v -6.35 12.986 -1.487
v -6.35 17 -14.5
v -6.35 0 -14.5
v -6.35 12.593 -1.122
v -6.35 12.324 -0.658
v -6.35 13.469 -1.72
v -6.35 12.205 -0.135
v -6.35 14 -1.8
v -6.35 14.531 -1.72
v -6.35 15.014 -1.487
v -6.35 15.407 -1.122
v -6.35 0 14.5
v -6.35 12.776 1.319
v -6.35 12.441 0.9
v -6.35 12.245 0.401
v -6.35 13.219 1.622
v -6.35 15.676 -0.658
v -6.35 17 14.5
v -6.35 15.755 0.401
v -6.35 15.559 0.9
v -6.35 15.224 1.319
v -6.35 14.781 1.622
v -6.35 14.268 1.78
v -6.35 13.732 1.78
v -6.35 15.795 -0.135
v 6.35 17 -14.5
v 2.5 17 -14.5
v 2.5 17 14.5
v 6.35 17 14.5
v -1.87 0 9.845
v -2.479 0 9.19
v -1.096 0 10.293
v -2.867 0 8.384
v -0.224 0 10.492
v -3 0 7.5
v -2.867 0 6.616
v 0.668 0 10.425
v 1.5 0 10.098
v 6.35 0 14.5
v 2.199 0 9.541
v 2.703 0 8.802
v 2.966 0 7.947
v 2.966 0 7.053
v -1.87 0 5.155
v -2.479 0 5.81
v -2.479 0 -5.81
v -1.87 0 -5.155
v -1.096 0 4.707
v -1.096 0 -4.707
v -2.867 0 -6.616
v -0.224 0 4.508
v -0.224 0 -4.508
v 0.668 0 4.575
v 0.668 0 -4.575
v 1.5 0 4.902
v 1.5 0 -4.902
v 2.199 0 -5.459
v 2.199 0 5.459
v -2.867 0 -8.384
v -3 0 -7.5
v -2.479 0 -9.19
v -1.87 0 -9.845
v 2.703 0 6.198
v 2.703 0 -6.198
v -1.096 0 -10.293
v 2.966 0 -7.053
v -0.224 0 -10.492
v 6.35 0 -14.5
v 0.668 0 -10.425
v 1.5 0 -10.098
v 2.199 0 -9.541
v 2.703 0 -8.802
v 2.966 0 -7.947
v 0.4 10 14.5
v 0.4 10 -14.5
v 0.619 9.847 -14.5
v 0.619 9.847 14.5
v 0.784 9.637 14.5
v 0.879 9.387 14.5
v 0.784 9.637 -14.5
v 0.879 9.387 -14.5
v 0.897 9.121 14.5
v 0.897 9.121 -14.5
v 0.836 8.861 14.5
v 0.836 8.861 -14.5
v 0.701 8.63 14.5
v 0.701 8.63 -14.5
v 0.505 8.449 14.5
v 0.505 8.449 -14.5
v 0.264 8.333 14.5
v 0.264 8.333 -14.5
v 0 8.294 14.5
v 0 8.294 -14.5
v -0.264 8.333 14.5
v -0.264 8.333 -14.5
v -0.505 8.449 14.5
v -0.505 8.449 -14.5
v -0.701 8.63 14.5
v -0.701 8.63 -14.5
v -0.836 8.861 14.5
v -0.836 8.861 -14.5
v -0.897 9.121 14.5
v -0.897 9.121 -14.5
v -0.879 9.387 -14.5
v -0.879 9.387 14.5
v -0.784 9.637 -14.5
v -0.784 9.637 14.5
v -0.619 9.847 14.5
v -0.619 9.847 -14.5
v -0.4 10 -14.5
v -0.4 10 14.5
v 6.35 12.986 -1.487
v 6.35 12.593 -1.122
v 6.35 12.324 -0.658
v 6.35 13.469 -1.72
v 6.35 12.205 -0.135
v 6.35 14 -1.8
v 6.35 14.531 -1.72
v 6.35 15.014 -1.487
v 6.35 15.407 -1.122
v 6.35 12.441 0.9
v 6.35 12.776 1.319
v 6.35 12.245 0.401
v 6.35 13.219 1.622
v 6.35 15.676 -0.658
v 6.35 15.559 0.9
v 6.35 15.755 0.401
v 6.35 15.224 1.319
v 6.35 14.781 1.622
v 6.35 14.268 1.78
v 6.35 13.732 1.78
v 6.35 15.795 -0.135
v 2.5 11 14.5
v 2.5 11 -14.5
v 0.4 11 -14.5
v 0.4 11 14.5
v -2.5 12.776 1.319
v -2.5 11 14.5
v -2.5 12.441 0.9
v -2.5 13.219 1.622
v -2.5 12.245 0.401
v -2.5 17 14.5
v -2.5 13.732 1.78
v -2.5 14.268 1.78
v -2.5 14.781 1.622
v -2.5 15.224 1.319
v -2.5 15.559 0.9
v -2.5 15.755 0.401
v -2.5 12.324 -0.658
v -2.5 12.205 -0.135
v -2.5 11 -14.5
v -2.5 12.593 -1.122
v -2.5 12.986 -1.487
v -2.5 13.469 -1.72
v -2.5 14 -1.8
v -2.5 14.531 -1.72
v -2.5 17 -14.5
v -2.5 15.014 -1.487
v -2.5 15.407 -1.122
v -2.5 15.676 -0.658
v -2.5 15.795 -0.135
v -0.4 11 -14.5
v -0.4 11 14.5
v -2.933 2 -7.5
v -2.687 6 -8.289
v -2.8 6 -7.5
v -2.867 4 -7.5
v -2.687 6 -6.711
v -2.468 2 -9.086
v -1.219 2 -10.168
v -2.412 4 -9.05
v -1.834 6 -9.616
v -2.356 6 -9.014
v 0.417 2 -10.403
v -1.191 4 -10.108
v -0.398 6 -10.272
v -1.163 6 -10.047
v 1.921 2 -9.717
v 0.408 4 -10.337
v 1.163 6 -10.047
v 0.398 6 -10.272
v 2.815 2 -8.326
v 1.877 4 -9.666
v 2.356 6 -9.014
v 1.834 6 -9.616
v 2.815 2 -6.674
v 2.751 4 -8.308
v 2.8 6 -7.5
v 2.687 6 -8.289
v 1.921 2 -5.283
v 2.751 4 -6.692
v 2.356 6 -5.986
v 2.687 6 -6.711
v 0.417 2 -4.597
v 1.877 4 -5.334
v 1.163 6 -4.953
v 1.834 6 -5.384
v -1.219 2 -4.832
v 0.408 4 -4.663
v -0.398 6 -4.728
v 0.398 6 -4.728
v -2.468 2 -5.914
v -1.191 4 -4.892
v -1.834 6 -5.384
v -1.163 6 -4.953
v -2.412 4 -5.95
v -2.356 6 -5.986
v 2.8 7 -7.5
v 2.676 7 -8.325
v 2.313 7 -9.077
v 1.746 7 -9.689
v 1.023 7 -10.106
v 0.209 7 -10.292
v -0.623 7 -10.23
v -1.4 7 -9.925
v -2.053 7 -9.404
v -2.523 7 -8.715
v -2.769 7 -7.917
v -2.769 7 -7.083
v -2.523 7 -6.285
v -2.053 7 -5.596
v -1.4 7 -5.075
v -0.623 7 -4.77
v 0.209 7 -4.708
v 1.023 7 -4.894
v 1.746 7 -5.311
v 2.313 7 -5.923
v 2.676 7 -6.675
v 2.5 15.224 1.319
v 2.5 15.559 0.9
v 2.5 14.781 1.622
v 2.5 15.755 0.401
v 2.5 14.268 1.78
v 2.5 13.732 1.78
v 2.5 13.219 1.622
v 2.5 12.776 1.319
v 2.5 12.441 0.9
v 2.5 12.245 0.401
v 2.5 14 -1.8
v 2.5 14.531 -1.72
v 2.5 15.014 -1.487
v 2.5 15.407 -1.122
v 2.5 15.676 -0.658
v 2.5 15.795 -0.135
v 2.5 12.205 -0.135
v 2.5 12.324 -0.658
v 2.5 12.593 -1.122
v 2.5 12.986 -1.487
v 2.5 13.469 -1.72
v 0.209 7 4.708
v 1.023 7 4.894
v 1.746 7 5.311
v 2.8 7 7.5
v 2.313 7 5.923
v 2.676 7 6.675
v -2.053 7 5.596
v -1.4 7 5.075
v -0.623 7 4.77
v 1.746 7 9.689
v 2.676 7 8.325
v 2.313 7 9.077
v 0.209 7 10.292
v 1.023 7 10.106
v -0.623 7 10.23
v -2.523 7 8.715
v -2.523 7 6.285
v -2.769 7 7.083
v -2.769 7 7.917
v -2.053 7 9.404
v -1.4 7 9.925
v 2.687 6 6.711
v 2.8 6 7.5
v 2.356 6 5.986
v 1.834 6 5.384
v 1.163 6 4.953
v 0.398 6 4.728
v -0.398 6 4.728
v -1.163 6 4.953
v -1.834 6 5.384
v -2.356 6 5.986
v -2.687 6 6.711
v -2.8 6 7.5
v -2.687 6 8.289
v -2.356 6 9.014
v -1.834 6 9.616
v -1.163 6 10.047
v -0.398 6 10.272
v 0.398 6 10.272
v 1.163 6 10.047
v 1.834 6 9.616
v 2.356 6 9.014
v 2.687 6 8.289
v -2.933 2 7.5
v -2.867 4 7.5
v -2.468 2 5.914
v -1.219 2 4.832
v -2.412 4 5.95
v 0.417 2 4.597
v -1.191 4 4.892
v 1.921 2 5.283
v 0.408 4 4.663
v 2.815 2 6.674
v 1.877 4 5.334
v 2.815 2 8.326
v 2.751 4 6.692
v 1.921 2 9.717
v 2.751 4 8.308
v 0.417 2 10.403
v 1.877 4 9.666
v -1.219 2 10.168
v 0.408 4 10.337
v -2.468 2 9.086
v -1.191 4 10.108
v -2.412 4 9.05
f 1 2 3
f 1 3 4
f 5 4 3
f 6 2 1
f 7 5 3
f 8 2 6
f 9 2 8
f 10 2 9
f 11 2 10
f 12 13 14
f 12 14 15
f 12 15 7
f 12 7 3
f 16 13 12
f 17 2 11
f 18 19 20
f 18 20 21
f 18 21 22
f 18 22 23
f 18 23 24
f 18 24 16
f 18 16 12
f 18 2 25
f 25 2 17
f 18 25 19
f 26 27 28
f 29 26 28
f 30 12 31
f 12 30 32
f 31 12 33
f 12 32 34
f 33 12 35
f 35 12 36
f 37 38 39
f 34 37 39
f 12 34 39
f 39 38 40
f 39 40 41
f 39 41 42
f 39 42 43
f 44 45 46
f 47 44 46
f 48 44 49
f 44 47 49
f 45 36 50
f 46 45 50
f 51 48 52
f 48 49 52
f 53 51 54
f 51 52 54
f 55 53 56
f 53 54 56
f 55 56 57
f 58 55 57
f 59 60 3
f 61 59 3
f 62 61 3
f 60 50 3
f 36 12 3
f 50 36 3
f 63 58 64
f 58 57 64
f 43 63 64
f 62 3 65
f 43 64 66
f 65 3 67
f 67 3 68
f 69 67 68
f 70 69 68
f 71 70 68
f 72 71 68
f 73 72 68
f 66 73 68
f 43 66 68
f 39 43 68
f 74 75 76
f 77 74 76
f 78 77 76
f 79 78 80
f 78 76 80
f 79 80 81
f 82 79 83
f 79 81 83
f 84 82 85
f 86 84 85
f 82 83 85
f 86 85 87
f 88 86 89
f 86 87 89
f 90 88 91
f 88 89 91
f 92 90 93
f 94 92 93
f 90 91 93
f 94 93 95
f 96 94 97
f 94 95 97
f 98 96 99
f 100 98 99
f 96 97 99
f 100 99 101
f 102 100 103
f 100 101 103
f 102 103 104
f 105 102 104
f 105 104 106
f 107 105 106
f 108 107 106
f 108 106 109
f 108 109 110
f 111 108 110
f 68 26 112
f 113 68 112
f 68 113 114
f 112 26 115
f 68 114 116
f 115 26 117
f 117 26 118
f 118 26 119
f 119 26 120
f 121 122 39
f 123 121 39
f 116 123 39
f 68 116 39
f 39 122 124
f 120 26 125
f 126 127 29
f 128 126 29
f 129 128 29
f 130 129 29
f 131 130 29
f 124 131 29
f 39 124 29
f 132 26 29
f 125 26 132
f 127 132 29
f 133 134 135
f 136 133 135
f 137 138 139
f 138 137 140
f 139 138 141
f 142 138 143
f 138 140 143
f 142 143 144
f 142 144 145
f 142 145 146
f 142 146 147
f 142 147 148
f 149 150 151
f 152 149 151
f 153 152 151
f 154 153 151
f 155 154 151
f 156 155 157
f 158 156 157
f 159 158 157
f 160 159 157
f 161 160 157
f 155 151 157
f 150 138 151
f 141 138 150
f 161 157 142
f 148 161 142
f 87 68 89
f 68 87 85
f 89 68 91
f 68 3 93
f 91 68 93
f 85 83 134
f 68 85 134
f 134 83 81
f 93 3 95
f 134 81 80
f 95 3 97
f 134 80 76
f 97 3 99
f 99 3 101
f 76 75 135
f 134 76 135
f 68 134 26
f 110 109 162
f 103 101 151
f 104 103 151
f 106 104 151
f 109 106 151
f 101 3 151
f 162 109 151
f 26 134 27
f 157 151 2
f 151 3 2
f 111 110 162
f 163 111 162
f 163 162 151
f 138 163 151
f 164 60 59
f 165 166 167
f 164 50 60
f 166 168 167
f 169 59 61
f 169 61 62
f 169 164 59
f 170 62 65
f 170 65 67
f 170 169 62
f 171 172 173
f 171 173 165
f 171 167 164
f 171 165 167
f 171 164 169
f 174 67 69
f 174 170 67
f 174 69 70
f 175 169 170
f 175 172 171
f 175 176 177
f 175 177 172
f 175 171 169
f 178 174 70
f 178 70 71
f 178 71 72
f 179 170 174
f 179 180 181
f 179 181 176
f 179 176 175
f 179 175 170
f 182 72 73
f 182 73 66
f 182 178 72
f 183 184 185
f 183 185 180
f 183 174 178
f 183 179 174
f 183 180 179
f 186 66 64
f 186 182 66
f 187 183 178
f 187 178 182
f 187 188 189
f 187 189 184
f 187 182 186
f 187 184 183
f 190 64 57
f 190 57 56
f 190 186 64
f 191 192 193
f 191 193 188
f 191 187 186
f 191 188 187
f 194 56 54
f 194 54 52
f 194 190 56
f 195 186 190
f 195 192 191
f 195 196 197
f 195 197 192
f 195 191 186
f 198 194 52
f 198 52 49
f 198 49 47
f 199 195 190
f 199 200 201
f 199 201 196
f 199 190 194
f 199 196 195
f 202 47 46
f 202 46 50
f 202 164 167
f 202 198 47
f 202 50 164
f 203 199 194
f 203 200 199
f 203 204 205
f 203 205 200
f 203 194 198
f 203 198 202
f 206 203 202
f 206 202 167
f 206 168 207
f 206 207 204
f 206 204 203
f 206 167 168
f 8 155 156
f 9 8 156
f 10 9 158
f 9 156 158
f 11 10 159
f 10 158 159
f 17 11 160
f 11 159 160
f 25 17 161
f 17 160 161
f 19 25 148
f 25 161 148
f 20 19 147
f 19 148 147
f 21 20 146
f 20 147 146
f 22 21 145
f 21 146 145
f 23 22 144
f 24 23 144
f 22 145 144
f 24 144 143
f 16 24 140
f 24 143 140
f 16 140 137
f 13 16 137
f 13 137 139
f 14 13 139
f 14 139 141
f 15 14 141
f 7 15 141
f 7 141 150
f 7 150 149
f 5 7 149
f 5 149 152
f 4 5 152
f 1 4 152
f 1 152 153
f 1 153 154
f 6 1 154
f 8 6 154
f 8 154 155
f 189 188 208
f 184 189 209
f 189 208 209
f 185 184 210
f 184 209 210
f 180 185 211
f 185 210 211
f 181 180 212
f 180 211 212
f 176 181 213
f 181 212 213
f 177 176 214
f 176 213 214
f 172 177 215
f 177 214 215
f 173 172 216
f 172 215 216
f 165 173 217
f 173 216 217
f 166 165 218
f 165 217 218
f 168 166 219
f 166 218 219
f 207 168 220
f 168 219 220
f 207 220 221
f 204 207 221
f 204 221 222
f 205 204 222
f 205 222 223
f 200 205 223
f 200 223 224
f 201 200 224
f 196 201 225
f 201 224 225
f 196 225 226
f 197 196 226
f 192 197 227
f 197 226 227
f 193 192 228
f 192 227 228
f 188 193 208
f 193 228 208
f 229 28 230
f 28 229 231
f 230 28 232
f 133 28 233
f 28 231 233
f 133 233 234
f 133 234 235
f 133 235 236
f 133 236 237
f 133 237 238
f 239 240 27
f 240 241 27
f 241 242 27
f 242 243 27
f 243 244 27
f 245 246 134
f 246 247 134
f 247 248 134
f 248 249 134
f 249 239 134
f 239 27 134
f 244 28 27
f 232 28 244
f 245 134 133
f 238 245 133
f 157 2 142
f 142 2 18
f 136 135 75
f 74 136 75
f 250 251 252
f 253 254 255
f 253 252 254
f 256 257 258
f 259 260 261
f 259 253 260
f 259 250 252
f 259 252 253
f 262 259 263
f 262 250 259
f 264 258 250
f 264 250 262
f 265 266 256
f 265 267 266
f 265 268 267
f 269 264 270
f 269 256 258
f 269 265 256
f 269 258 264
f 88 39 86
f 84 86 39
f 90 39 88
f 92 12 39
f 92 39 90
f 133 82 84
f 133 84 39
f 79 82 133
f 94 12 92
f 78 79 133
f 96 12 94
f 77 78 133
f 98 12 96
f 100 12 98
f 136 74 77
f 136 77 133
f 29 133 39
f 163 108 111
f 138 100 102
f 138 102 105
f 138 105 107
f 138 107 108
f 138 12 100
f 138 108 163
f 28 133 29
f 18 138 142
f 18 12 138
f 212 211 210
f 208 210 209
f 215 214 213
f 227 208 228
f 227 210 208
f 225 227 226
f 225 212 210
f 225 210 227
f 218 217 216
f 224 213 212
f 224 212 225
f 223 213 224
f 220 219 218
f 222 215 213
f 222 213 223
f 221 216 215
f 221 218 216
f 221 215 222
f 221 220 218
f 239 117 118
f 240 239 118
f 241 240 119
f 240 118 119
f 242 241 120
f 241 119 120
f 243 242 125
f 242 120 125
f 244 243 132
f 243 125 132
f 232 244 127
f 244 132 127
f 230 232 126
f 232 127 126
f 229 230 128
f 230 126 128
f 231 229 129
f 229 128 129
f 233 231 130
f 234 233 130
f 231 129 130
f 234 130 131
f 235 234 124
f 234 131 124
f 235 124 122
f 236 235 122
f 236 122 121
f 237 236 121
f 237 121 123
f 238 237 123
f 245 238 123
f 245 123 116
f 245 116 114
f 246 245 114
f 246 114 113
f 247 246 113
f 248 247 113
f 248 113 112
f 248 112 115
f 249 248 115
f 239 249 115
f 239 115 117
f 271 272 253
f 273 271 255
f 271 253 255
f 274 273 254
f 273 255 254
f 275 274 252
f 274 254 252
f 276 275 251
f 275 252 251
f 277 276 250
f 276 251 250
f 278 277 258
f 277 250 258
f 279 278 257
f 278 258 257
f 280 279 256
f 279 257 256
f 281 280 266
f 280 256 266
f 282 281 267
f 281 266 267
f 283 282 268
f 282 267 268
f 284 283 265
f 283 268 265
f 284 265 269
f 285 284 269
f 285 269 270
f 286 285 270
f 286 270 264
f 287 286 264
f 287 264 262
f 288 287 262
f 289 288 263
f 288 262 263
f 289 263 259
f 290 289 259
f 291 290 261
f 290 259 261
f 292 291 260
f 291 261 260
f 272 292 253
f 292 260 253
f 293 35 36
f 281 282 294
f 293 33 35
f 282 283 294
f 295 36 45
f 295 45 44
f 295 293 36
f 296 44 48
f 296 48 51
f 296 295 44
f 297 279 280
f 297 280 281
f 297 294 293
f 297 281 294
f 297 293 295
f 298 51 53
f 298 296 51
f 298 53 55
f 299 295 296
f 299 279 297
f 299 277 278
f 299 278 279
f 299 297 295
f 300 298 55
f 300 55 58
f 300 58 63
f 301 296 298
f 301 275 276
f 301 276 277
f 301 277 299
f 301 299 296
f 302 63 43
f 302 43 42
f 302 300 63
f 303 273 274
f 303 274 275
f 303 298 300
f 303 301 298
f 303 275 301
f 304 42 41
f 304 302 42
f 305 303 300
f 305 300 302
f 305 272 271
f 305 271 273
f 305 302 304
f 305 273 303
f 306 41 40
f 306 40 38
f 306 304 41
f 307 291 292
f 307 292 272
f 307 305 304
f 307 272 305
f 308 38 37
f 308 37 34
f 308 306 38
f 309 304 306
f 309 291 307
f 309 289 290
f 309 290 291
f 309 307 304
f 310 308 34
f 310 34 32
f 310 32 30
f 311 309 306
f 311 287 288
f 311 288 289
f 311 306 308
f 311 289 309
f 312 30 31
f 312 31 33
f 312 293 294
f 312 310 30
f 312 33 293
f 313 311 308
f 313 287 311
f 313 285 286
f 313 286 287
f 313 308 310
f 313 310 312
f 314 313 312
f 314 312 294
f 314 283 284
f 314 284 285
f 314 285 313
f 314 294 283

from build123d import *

# Parameters (mm, degrees)
SKETCH1_W            = 12.7
SKETCH1_H            = 29
BOSS_EXTRUDE1_DEPTH  = 7
HOLE1_D              = 5.6
HOLE1_CBORE_D        = 6
HOLE1_CBORE_DEPTH    = 6
SKETCH4_W            = 29
SKETCH4_H            = 10
BOSS_EXTRUDE2_DEPTH  = 12.7
CUT_EXTRUDE1_DEPTH   = 35.209976615
M3_CLEARANCE_HOLE1_D = 3.6
CHAMFER1_SIZE        = 6
CHAMFER1_SIZE_2      = 0.2


with BuildPart() as part:
    # Sketch1 → Boss-Extrude1 (new body)
    with BuildSketch(Plane(origin=(0, 0, 0), x_dir=(1, 0, 0), z_dir=(0, 1, 0))):
        Rectangle(SKETCH1_W, SKETCH1_H)
    extrude(amount=BOSS_EXTRUDE1_DEPTH)

    # Hole1 (through all)
    with Locations(Plane(origin=(0, 0, 0), x_dir=(-1, 0, 0), z_dir=(0, -1, 0))):
        with Locations((0, -7.5), (0, 7.5)):
            CounterBoreHole(HOLE1_D / 2, HOLE1_CBORE_D / 2, HOLE1_CBORE_DEPTH)

    # Sketch4 → Boss-Extrude2 (add)
    with BuildSketch(Plane.ZY.offset(6.35)):
        with Locations((0, 12)):
            Rectangle(SKETCH4_W, SKETCH4_H)
    extrude(amount=-BOSS_EXTRUDE2_DEPTH)

    # Sketch5 → Cut-Extrude1 (cut, through all)
    with BuildSketch(Plane(origin=(0, 0, -14.5), x_dir=(-1, 0, 0), z_dir=(0, 0, -1))):
        with BuildLine():
            Line((-0.4, 11), (-0.4, 10))
            ThreePointArc((-0.4, 10), (0, 8.293774225), (0.4, 10))
            Line((0.4, 10), (0.4, 11))
            Line((0.4, 11), (2.5, 11))
            Line((2.5, 11), (2.5, 17))
            Line((2.5, 17), (-2.5, 17))
            Line((-2.5, 17), (-2.5, 11))
            Line((-2.5, 11), (-0.4, 11))
        make_face()
    extrude(amount=-CUT_EXTRUDE1_DEPTH, mode=Mode.SUBTRACT)

    # M3 Clearance Hole1 (through all)
    with Locations(Plane.ZY.offset(6.35)):
        with Locations((0, 14)):
            Hole(M3_CLEARANCE_HOLE1_D / 2)

    # Chamfer1
    # the kernel refuses this chamfer: 6, 0.2 mm, written as the material it adds along each edge
    with BuildSketch(Plane(origin=(0, 6, -7.5), x_dir=(-1, 0, 0), z_dir=(0, 0, 1))) as chamfer1_piece_1_section:
        Polygon((3, CHAMFER1_SIZE), (3 - CHAMFER1_SIZE_2, 0), (3, 0), align=None)
    chamfer1_piece_1 = revolve(axis=Axis((0, 6, -7.5), (0, -1, 0)), mode=Mode.PRIVATE)
    chamfer1_piece_1 = split(chamfer1_piece_1, bisect_by=Plane(origin=(2.92947192, 0, -7.5), z_dir=(0, 1, 0)), keep=Keep.TOP, mode=Mode.PRIVATE)
    chamfer1_piece_1 = chamfer1_piece_1 - Plane(origin=(0, 3.000982397, -7.5), x_dir=(1, 0, 0), z_dir=(0, 1, 0)) * Cylinder(2.8, 24, mode=Mode.PRIVATE)
    add(chamfer1_piece_1)
    with BuildSketch(Plane(origin=(0, 6, 7.5), x_dir=(-1, 0, 0), z_dir=(0, 0, 1))) as chamfer1_piece_2_section:
        Polygon((3, CHAMFER1_SIZE), (3 - CHAMFER1_SIZE_2, 0), (3, 0), align=None)
    chamfer1_piece_2 = revolve(axis=Axis((0, 6, 7.5), (0, -1, 0)), mode=Mode.PRIVATE)
    chamfer1_piece_2 = split(chamfer1_piece_2, bisect_by=Plane(origin=(2.92947192, 0, 7.5), z_dir=(0, 1, 0)), keep=Keep.TOP, mode=Mode.PRIVATE)
    chamfer1_piece_2 = chamfer1_piece_2 - Plane(origin=(0, 3.000982397, 7.5), x_dir=(1, 0, 0), z_dir=(0, 1, 0)) * Cylinder(2.8, 24, mode=Mode.PRIVATE)
    add(chamfer1_piece_2)


solid = part.part
